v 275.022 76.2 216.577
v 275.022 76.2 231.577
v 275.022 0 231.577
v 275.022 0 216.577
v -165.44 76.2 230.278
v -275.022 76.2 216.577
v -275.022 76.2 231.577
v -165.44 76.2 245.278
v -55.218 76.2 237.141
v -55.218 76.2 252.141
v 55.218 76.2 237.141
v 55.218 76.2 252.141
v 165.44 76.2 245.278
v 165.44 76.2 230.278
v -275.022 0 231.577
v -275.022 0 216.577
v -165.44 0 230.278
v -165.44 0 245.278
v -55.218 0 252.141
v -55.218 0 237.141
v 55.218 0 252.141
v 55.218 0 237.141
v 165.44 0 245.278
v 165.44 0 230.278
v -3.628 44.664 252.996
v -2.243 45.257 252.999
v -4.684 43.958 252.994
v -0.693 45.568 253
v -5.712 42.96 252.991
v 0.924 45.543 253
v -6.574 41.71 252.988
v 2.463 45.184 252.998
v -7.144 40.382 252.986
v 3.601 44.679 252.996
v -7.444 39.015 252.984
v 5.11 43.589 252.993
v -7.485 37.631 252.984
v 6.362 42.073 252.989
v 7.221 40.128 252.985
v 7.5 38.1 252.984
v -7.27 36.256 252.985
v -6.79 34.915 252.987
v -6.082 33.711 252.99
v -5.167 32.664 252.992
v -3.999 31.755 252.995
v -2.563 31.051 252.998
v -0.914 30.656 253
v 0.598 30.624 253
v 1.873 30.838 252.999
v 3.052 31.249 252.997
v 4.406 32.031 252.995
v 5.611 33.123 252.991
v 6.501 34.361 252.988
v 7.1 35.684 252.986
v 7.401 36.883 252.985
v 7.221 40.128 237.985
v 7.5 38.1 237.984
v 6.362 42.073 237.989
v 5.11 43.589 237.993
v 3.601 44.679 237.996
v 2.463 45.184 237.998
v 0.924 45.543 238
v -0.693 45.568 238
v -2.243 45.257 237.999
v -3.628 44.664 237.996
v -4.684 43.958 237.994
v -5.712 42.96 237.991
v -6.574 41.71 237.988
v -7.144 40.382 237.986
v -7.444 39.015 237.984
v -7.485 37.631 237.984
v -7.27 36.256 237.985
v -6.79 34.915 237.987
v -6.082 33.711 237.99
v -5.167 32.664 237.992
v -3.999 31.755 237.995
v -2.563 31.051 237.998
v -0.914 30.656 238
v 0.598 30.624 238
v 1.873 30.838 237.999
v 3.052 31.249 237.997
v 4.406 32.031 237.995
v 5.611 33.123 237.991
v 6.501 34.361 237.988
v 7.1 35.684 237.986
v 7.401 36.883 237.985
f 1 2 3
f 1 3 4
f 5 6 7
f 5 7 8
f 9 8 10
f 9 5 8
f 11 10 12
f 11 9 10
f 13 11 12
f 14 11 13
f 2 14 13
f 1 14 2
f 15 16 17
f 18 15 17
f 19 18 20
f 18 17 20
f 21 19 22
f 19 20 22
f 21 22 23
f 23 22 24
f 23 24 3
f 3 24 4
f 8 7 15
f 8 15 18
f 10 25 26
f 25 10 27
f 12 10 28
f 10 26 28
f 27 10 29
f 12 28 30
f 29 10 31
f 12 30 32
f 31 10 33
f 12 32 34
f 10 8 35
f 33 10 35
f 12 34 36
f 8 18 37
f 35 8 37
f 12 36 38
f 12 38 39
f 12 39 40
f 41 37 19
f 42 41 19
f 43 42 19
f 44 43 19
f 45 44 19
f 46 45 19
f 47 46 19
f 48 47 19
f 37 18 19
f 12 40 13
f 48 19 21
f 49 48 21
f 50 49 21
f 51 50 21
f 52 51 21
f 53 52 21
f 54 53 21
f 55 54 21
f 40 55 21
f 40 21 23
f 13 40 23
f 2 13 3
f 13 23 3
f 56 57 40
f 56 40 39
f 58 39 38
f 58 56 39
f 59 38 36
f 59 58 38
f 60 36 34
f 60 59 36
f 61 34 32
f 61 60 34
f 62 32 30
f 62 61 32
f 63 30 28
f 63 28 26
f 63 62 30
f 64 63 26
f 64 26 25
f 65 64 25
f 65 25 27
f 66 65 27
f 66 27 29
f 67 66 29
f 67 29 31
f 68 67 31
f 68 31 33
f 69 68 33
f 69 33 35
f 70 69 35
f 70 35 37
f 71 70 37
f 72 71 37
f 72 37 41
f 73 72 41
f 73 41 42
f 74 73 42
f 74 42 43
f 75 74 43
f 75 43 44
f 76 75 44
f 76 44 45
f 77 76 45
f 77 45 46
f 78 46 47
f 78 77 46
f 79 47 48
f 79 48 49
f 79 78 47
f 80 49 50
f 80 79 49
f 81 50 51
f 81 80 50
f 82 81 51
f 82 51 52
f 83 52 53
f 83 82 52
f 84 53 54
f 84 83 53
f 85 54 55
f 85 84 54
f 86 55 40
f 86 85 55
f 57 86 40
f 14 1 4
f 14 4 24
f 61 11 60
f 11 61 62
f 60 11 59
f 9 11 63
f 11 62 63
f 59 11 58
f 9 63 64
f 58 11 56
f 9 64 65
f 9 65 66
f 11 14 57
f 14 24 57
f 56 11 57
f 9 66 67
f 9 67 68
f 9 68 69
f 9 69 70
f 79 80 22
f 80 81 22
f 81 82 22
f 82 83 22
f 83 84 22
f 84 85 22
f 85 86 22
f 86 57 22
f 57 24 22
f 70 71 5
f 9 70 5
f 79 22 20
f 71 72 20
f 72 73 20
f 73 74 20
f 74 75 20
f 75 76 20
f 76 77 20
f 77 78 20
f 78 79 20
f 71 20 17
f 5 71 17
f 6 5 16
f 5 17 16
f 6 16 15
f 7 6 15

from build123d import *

# Parameters (mm, degrees)
BOSS_EXTRUDE1_DEPTH = 76.2
SKETCH12_R          = 7.5
CUT_EXTRUDE1_DEPTH  = 254


with BuildPart() as part:
    # Sketch1 → Boss-Extrude1 (new body)
    with BuildSketch(Plane(origin=(0, 0, 0), x_dir=(1, 0, 0), z_dir=(0, 1, 0))):
        with BuildLine():
            ThreePointArc((275.021699517, -216.577215773), (0, -238), (-275.021699517, -216.577215773))
            Line((-275.021699517, -216.577215773), (-275.021699517, -231.577215773))
            ThreePointArc((-275.021699517, -231.577215773), (0, -253), (275.021699517, -231.577215773))
            Line((275.021699517, -231.577215773), (275.021699517, -216.577215773))
        make_face()
    extrude(amount=BOSS_EXTRUDE1_DEPTH)

    # Sketch12 → Cut-Extrude1 (cut, through all)
    with BuildSketch(Plane.XY):
        with Locations((0, 38.1)):
            Circle(SKETCH12_R)
    extrude(amount=CUT_EXTRUDE1_DEPTH, mode=Mode.SUBTRACT)


solid = part.part
